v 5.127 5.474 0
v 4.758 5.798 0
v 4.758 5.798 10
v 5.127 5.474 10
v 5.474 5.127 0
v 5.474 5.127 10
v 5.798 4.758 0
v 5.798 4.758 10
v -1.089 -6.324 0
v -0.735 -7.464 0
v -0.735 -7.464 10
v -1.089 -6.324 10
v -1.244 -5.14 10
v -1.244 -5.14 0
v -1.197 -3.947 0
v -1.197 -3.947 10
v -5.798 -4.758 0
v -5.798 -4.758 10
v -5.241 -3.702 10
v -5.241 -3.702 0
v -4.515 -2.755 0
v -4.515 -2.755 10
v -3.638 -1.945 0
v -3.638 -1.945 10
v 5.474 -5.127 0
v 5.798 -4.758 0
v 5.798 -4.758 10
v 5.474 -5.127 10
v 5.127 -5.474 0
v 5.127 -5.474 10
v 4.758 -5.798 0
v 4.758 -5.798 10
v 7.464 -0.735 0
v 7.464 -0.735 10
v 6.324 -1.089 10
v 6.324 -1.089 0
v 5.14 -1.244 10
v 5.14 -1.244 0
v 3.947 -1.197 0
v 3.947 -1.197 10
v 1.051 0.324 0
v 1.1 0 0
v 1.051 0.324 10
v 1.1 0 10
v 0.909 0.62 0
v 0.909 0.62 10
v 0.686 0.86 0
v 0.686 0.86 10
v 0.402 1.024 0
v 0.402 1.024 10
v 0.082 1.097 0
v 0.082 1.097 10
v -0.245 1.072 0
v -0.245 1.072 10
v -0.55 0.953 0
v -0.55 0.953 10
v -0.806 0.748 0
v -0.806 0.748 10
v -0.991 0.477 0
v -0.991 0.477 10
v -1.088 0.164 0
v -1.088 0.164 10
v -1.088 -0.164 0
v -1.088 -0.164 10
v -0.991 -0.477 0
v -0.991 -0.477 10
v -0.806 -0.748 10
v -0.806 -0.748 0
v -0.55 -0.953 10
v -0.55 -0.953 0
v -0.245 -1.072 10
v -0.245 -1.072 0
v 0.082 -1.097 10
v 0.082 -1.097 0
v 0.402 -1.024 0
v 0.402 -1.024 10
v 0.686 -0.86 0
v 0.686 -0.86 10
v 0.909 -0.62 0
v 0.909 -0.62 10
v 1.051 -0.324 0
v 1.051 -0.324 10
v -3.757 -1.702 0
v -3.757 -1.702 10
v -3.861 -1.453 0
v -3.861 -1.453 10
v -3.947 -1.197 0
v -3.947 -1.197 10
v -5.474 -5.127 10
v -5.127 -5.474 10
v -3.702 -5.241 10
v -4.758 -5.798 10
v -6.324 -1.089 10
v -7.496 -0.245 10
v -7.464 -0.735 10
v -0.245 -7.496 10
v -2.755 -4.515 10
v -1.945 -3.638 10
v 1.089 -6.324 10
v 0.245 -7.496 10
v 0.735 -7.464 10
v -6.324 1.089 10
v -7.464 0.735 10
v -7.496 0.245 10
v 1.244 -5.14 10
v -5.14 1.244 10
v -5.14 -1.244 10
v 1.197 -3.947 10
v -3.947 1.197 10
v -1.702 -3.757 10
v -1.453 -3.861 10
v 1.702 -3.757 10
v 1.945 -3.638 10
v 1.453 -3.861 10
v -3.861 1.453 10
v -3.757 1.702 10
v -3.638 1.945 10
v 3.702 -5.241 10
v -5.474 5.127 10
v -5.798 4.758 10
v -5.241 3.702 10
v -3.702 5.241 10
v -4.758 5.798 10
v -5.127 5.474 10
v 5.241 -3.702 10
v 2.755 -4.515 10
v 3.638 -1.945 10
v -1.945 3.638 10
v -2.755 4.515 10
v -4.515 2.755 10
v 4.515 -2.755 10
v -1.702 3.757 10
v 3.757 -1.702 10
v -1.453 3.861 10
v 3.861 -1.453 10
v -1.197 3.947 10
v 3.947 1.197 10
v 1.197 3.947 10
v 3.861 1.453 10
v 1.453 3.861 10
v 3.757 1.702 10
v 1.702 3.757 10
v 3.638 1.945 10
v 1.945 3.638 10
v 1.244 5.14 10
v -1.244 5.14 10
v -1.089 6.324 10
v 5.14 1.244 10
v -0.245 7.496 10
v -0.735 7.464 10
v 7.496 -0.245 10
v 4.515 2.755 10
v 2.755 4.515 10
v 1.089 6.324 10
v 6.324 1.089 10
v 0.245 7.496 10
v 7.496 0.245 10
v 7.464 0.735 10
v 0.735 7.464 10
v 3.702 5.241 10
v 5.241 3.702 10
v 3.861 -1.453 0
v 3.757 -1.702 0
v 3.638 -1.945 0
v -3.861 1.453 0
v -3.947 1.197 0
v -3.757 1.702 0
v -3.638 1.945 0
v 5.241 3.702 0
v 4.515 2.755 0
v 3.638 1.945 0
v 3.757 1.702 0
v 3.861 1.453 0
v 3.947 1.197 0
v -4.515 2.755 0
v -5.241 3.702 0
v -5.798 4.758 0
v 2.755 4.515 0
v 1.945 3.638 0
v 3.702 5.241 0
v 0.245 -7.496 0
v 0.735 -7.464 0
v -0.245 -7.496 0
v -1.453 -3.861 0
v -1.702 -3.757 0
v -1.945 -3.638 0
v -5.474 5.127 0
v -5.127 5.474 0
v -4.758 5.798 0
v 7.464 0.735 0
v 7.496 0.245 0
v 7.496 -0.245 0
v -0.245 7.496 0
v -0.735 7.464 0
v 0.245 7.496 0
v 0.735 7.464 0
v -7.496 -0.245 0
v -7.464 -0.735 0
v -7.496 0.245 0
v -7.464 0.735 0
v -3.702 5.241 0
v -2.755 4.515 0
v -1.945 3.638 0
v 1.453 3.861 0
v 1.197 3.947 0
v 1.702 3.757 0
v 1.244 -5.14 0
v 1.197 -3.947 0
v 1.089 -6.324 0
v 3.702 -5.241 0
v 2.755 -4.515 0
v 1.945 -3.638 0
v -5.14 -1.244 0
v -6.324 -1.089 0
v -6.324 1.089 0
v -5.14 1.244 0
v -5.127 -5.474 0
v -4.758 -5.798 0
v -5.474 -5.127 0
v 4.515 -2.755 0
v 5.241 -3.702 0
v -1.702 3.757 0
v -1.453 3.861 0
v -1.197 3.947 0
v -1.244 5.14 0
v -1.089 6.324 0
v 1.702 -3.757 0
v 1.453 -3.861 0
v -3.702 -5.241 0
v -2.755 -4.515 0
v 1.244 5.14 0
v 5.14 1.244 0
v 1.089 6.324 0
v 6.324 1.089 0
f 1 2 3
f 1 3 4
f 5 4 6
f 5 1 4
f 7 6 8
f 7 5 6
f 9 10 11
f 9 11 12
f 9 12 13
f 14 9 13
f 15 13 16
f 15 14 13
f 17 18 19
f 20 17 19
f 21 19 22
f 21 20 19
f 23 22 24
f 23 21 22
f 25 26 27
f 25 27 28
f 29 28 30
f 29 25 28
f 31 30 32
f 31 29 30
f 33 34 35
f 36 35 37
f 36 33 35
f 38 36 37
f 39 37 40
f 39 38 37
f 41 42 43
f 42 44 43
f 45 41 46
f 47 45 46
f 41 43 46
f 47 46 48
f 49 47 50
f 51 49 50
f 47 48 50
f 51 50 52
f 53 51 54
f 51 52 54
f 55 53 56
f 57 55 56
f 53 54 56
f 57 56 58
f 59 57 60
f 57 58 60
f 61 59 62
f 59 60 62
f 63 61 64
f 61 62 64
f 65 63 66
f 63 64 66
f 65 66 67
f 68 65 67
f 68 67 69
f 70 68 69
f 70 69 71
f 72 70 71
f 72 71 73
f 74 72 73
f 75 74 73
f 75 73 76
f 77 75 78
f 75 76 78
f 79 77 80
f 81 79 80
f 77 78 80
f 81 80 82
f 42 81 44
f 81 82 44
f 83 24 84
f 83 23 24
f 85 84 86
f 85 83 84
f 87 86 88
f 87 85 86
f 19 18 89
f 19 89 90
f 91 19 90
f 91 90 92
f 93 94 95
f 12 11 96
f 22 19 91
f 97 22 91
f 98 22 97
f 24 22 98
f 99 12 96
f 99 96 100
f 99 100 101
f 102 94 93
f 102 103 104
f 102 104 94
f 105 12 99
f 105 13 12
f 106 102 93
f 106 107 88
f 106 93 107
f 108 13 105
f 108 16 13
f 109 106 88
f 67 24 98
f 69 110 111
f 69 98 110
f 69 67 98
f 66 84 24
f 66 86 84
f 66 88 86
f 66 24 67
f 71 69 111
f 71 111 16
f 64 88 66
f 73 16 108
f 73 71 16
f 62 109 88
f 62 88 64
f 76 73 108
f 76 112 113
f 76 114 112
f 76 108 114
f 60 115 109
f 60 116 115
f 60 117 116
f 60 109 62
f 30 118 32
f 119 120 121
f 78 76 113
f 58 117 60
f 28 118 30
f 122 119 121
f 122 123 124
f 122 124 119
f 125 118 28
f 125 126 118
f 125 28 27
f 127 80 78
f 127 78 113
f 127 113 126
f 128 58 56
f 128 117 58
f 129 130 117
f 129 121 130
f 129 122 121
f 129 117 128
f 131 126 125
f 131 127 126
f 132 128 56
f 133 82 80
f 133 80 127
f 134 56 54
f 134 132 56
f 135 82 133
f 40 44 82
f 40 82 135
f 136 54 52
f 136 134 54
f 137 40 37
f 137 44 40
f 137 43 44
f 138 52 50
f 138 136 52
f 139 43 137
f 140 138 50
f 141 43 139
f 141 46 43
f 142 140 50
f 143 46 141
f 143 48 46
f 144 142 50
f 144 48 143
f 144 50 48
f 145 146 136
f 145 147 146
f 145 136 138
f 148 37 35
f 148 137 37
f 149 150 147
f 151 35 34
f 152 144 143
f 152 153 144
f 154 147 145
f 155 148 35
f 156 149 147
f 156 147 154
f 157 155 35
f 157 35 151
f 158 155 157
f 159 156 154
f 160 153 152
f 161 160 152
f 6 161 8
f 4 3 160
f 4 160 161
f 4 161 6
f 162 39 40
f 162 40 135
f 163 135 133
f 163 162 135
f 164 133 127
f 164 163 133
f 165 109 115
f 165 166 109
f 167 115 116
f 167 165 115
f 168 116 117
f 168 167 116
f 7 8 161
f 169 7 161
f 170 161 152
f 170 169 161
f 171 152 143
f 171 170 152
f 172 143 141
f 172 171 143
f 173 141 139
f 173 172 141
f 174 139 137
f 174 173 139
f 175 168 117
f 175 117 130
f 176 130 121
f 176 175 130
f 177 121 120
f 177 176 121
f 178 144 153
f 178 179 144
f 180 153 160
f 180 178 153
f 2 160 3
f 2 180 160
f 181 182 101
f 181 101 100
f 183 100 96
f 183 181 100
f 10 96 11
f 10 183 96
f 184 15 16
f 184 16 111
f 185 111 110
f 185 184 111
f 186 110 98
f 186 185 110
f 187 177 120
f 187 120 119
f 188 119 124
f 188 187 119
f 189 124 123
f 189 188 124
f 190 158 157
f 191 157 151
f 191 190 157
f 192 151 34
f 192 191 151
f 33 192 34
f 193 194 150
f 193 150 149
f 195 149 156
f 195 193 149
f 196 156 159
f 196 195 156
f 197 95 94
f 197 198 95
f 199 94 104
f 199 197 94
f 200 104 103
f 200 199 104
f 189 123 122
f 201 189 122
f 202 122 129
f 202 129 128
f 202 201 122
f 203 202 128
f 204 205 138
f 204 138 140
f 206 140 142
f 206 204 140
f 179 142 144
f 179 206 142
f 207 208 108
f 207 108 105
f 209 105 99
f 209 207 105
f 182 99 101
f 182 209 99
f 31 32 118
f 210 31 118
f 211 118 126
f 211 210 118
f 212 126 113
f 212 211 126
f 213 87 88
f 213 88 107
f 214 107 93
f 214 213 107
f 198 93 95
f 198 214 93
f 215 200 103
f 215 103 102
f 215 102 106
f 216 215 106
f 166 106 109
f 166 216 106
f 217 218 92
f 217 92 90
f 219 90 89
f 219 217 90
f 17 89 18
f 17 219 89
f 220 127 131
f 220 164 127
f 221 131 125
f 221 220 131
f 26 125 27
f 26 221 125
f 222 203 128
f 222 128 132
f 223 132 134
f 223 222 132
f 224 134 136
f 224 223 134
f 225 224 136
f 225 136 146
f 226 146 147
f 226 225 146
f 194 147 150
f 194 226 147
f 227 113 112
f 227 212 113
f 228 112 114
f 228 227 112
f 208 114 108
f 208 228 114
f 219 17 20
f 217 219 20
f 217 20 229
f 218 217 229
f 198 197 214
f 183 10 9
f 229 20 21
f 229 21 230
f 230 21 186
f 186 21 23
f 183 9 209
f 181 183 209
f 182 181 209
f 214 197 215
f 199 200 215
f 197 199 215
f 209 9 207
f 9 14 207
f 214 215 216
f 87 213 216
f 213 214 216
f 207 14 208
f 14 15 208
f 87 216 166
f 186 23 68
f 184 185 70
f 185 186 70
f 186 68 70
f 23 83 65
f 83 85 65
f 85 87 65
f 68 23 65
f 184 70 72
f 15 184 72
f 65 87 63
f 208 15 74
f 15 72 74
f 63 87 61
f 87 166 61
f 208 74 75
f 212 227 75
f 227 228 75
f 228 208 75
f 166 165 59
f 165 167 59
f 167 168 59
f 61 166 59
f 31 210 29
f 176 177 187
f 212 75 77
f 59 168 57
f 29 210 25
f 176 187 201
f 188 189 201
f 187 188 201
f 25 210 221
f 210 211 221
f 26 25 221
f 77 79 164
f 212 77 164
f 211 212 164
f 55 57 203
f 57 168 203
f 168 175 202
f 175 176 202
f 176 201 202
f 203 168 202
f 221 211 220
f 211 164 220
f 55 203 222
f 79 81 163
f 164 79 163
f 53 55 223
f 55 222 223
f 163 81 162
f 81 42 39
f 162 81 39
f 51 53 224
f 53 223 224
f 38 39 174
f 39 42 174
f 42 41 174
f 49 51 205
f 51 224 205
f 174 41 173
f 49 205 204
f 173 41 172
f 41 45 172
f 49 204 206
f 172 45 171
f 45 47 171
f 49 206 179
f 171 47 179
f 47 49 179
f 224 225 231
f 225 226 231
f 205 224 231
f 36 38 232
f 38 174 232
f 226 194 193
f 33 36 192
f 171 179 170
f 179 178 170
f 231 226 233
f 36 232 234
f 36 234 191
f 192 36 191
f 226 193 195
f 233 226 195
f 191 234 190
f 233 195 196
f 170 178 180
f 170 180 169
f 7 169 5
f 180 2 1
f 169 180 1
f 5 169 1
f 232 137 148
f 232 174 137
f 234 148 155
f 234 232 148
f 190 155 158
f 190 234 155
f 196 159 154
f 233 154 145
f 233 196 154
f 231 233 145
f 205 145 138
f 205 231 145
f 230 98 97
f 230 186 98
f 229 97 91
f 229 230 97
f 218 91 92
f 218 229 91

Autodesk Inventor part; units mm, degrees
sketch "Sketch1" plane through (0, 0, 0) normal (0, 0, 1) x (1, 0, 0)
  circle A0 centre (0, 0) radius 7.5
  dimension "d0" = 15
extrude "Extrusion1" add sketch "Sketch1" along normal blind 10
ref_plane "Work Plane2" through (0, 0, 5) normal (0, 0, 1) x (1, 0, 0)
sketch "Sketch2" plane through (0, 0, 0) normal (0, 0, -1) x (-1, 0, 0)
  circle A0 centre (0, 0) radius 7.5 projected
  circle A1 centre (0, 0) radius 6
  dimension "d3" = 12
surface extrude "Pitch Diameter" sketch "Sketch2" against normal through all shown no curves A1
ref_plane "Work Plane8" through (0, 0, 0) normal (0.9238795, 0.3826834, 0) x (0, 0, 1)
ref_plane "Work Plane9" through (0, 0, 0) normal (1, 0, 0) x (0, 1, 0)
spur gear teeth "Spur Gear" teeth 8 pitch diameter 12 tip diameter 15 root diameter 8.25 face width 10 start plane through (0, 0, 0) normal (0, 0, -1) x (-1, 0, 0)
sketch "Sketch3" plane through (0, 0, 10) normal (0, 0, 1) x (1, 0, 0)
  arc A0 (-4.7579, 5.7976) -> (-5.7976, 4.7579) centre (0, 0) ccw projected
  circle A1 centre (0, 0) radius 1.1
  dimension "d49" = 2.2
extrude "Extrusion2" cut sketch "Sketch3" against normal blind 10
equation "\"d0\" = da_da"
equation "\"d1\" = da_b"
equation "\"d3\" = da_dw"
equation "\"d16\" = da_aw"
equation "\"d43\" = da_aw"
equation "\"d46\" = da_aw"
equation "\"da_da\" = 15"
equation "\"da_b\" = 10"
equation "\"da_dw\" = 12"
equation "\"da_aw\" = 51"
properties part number "Spur Gear1" material "Steel, Alloy"
